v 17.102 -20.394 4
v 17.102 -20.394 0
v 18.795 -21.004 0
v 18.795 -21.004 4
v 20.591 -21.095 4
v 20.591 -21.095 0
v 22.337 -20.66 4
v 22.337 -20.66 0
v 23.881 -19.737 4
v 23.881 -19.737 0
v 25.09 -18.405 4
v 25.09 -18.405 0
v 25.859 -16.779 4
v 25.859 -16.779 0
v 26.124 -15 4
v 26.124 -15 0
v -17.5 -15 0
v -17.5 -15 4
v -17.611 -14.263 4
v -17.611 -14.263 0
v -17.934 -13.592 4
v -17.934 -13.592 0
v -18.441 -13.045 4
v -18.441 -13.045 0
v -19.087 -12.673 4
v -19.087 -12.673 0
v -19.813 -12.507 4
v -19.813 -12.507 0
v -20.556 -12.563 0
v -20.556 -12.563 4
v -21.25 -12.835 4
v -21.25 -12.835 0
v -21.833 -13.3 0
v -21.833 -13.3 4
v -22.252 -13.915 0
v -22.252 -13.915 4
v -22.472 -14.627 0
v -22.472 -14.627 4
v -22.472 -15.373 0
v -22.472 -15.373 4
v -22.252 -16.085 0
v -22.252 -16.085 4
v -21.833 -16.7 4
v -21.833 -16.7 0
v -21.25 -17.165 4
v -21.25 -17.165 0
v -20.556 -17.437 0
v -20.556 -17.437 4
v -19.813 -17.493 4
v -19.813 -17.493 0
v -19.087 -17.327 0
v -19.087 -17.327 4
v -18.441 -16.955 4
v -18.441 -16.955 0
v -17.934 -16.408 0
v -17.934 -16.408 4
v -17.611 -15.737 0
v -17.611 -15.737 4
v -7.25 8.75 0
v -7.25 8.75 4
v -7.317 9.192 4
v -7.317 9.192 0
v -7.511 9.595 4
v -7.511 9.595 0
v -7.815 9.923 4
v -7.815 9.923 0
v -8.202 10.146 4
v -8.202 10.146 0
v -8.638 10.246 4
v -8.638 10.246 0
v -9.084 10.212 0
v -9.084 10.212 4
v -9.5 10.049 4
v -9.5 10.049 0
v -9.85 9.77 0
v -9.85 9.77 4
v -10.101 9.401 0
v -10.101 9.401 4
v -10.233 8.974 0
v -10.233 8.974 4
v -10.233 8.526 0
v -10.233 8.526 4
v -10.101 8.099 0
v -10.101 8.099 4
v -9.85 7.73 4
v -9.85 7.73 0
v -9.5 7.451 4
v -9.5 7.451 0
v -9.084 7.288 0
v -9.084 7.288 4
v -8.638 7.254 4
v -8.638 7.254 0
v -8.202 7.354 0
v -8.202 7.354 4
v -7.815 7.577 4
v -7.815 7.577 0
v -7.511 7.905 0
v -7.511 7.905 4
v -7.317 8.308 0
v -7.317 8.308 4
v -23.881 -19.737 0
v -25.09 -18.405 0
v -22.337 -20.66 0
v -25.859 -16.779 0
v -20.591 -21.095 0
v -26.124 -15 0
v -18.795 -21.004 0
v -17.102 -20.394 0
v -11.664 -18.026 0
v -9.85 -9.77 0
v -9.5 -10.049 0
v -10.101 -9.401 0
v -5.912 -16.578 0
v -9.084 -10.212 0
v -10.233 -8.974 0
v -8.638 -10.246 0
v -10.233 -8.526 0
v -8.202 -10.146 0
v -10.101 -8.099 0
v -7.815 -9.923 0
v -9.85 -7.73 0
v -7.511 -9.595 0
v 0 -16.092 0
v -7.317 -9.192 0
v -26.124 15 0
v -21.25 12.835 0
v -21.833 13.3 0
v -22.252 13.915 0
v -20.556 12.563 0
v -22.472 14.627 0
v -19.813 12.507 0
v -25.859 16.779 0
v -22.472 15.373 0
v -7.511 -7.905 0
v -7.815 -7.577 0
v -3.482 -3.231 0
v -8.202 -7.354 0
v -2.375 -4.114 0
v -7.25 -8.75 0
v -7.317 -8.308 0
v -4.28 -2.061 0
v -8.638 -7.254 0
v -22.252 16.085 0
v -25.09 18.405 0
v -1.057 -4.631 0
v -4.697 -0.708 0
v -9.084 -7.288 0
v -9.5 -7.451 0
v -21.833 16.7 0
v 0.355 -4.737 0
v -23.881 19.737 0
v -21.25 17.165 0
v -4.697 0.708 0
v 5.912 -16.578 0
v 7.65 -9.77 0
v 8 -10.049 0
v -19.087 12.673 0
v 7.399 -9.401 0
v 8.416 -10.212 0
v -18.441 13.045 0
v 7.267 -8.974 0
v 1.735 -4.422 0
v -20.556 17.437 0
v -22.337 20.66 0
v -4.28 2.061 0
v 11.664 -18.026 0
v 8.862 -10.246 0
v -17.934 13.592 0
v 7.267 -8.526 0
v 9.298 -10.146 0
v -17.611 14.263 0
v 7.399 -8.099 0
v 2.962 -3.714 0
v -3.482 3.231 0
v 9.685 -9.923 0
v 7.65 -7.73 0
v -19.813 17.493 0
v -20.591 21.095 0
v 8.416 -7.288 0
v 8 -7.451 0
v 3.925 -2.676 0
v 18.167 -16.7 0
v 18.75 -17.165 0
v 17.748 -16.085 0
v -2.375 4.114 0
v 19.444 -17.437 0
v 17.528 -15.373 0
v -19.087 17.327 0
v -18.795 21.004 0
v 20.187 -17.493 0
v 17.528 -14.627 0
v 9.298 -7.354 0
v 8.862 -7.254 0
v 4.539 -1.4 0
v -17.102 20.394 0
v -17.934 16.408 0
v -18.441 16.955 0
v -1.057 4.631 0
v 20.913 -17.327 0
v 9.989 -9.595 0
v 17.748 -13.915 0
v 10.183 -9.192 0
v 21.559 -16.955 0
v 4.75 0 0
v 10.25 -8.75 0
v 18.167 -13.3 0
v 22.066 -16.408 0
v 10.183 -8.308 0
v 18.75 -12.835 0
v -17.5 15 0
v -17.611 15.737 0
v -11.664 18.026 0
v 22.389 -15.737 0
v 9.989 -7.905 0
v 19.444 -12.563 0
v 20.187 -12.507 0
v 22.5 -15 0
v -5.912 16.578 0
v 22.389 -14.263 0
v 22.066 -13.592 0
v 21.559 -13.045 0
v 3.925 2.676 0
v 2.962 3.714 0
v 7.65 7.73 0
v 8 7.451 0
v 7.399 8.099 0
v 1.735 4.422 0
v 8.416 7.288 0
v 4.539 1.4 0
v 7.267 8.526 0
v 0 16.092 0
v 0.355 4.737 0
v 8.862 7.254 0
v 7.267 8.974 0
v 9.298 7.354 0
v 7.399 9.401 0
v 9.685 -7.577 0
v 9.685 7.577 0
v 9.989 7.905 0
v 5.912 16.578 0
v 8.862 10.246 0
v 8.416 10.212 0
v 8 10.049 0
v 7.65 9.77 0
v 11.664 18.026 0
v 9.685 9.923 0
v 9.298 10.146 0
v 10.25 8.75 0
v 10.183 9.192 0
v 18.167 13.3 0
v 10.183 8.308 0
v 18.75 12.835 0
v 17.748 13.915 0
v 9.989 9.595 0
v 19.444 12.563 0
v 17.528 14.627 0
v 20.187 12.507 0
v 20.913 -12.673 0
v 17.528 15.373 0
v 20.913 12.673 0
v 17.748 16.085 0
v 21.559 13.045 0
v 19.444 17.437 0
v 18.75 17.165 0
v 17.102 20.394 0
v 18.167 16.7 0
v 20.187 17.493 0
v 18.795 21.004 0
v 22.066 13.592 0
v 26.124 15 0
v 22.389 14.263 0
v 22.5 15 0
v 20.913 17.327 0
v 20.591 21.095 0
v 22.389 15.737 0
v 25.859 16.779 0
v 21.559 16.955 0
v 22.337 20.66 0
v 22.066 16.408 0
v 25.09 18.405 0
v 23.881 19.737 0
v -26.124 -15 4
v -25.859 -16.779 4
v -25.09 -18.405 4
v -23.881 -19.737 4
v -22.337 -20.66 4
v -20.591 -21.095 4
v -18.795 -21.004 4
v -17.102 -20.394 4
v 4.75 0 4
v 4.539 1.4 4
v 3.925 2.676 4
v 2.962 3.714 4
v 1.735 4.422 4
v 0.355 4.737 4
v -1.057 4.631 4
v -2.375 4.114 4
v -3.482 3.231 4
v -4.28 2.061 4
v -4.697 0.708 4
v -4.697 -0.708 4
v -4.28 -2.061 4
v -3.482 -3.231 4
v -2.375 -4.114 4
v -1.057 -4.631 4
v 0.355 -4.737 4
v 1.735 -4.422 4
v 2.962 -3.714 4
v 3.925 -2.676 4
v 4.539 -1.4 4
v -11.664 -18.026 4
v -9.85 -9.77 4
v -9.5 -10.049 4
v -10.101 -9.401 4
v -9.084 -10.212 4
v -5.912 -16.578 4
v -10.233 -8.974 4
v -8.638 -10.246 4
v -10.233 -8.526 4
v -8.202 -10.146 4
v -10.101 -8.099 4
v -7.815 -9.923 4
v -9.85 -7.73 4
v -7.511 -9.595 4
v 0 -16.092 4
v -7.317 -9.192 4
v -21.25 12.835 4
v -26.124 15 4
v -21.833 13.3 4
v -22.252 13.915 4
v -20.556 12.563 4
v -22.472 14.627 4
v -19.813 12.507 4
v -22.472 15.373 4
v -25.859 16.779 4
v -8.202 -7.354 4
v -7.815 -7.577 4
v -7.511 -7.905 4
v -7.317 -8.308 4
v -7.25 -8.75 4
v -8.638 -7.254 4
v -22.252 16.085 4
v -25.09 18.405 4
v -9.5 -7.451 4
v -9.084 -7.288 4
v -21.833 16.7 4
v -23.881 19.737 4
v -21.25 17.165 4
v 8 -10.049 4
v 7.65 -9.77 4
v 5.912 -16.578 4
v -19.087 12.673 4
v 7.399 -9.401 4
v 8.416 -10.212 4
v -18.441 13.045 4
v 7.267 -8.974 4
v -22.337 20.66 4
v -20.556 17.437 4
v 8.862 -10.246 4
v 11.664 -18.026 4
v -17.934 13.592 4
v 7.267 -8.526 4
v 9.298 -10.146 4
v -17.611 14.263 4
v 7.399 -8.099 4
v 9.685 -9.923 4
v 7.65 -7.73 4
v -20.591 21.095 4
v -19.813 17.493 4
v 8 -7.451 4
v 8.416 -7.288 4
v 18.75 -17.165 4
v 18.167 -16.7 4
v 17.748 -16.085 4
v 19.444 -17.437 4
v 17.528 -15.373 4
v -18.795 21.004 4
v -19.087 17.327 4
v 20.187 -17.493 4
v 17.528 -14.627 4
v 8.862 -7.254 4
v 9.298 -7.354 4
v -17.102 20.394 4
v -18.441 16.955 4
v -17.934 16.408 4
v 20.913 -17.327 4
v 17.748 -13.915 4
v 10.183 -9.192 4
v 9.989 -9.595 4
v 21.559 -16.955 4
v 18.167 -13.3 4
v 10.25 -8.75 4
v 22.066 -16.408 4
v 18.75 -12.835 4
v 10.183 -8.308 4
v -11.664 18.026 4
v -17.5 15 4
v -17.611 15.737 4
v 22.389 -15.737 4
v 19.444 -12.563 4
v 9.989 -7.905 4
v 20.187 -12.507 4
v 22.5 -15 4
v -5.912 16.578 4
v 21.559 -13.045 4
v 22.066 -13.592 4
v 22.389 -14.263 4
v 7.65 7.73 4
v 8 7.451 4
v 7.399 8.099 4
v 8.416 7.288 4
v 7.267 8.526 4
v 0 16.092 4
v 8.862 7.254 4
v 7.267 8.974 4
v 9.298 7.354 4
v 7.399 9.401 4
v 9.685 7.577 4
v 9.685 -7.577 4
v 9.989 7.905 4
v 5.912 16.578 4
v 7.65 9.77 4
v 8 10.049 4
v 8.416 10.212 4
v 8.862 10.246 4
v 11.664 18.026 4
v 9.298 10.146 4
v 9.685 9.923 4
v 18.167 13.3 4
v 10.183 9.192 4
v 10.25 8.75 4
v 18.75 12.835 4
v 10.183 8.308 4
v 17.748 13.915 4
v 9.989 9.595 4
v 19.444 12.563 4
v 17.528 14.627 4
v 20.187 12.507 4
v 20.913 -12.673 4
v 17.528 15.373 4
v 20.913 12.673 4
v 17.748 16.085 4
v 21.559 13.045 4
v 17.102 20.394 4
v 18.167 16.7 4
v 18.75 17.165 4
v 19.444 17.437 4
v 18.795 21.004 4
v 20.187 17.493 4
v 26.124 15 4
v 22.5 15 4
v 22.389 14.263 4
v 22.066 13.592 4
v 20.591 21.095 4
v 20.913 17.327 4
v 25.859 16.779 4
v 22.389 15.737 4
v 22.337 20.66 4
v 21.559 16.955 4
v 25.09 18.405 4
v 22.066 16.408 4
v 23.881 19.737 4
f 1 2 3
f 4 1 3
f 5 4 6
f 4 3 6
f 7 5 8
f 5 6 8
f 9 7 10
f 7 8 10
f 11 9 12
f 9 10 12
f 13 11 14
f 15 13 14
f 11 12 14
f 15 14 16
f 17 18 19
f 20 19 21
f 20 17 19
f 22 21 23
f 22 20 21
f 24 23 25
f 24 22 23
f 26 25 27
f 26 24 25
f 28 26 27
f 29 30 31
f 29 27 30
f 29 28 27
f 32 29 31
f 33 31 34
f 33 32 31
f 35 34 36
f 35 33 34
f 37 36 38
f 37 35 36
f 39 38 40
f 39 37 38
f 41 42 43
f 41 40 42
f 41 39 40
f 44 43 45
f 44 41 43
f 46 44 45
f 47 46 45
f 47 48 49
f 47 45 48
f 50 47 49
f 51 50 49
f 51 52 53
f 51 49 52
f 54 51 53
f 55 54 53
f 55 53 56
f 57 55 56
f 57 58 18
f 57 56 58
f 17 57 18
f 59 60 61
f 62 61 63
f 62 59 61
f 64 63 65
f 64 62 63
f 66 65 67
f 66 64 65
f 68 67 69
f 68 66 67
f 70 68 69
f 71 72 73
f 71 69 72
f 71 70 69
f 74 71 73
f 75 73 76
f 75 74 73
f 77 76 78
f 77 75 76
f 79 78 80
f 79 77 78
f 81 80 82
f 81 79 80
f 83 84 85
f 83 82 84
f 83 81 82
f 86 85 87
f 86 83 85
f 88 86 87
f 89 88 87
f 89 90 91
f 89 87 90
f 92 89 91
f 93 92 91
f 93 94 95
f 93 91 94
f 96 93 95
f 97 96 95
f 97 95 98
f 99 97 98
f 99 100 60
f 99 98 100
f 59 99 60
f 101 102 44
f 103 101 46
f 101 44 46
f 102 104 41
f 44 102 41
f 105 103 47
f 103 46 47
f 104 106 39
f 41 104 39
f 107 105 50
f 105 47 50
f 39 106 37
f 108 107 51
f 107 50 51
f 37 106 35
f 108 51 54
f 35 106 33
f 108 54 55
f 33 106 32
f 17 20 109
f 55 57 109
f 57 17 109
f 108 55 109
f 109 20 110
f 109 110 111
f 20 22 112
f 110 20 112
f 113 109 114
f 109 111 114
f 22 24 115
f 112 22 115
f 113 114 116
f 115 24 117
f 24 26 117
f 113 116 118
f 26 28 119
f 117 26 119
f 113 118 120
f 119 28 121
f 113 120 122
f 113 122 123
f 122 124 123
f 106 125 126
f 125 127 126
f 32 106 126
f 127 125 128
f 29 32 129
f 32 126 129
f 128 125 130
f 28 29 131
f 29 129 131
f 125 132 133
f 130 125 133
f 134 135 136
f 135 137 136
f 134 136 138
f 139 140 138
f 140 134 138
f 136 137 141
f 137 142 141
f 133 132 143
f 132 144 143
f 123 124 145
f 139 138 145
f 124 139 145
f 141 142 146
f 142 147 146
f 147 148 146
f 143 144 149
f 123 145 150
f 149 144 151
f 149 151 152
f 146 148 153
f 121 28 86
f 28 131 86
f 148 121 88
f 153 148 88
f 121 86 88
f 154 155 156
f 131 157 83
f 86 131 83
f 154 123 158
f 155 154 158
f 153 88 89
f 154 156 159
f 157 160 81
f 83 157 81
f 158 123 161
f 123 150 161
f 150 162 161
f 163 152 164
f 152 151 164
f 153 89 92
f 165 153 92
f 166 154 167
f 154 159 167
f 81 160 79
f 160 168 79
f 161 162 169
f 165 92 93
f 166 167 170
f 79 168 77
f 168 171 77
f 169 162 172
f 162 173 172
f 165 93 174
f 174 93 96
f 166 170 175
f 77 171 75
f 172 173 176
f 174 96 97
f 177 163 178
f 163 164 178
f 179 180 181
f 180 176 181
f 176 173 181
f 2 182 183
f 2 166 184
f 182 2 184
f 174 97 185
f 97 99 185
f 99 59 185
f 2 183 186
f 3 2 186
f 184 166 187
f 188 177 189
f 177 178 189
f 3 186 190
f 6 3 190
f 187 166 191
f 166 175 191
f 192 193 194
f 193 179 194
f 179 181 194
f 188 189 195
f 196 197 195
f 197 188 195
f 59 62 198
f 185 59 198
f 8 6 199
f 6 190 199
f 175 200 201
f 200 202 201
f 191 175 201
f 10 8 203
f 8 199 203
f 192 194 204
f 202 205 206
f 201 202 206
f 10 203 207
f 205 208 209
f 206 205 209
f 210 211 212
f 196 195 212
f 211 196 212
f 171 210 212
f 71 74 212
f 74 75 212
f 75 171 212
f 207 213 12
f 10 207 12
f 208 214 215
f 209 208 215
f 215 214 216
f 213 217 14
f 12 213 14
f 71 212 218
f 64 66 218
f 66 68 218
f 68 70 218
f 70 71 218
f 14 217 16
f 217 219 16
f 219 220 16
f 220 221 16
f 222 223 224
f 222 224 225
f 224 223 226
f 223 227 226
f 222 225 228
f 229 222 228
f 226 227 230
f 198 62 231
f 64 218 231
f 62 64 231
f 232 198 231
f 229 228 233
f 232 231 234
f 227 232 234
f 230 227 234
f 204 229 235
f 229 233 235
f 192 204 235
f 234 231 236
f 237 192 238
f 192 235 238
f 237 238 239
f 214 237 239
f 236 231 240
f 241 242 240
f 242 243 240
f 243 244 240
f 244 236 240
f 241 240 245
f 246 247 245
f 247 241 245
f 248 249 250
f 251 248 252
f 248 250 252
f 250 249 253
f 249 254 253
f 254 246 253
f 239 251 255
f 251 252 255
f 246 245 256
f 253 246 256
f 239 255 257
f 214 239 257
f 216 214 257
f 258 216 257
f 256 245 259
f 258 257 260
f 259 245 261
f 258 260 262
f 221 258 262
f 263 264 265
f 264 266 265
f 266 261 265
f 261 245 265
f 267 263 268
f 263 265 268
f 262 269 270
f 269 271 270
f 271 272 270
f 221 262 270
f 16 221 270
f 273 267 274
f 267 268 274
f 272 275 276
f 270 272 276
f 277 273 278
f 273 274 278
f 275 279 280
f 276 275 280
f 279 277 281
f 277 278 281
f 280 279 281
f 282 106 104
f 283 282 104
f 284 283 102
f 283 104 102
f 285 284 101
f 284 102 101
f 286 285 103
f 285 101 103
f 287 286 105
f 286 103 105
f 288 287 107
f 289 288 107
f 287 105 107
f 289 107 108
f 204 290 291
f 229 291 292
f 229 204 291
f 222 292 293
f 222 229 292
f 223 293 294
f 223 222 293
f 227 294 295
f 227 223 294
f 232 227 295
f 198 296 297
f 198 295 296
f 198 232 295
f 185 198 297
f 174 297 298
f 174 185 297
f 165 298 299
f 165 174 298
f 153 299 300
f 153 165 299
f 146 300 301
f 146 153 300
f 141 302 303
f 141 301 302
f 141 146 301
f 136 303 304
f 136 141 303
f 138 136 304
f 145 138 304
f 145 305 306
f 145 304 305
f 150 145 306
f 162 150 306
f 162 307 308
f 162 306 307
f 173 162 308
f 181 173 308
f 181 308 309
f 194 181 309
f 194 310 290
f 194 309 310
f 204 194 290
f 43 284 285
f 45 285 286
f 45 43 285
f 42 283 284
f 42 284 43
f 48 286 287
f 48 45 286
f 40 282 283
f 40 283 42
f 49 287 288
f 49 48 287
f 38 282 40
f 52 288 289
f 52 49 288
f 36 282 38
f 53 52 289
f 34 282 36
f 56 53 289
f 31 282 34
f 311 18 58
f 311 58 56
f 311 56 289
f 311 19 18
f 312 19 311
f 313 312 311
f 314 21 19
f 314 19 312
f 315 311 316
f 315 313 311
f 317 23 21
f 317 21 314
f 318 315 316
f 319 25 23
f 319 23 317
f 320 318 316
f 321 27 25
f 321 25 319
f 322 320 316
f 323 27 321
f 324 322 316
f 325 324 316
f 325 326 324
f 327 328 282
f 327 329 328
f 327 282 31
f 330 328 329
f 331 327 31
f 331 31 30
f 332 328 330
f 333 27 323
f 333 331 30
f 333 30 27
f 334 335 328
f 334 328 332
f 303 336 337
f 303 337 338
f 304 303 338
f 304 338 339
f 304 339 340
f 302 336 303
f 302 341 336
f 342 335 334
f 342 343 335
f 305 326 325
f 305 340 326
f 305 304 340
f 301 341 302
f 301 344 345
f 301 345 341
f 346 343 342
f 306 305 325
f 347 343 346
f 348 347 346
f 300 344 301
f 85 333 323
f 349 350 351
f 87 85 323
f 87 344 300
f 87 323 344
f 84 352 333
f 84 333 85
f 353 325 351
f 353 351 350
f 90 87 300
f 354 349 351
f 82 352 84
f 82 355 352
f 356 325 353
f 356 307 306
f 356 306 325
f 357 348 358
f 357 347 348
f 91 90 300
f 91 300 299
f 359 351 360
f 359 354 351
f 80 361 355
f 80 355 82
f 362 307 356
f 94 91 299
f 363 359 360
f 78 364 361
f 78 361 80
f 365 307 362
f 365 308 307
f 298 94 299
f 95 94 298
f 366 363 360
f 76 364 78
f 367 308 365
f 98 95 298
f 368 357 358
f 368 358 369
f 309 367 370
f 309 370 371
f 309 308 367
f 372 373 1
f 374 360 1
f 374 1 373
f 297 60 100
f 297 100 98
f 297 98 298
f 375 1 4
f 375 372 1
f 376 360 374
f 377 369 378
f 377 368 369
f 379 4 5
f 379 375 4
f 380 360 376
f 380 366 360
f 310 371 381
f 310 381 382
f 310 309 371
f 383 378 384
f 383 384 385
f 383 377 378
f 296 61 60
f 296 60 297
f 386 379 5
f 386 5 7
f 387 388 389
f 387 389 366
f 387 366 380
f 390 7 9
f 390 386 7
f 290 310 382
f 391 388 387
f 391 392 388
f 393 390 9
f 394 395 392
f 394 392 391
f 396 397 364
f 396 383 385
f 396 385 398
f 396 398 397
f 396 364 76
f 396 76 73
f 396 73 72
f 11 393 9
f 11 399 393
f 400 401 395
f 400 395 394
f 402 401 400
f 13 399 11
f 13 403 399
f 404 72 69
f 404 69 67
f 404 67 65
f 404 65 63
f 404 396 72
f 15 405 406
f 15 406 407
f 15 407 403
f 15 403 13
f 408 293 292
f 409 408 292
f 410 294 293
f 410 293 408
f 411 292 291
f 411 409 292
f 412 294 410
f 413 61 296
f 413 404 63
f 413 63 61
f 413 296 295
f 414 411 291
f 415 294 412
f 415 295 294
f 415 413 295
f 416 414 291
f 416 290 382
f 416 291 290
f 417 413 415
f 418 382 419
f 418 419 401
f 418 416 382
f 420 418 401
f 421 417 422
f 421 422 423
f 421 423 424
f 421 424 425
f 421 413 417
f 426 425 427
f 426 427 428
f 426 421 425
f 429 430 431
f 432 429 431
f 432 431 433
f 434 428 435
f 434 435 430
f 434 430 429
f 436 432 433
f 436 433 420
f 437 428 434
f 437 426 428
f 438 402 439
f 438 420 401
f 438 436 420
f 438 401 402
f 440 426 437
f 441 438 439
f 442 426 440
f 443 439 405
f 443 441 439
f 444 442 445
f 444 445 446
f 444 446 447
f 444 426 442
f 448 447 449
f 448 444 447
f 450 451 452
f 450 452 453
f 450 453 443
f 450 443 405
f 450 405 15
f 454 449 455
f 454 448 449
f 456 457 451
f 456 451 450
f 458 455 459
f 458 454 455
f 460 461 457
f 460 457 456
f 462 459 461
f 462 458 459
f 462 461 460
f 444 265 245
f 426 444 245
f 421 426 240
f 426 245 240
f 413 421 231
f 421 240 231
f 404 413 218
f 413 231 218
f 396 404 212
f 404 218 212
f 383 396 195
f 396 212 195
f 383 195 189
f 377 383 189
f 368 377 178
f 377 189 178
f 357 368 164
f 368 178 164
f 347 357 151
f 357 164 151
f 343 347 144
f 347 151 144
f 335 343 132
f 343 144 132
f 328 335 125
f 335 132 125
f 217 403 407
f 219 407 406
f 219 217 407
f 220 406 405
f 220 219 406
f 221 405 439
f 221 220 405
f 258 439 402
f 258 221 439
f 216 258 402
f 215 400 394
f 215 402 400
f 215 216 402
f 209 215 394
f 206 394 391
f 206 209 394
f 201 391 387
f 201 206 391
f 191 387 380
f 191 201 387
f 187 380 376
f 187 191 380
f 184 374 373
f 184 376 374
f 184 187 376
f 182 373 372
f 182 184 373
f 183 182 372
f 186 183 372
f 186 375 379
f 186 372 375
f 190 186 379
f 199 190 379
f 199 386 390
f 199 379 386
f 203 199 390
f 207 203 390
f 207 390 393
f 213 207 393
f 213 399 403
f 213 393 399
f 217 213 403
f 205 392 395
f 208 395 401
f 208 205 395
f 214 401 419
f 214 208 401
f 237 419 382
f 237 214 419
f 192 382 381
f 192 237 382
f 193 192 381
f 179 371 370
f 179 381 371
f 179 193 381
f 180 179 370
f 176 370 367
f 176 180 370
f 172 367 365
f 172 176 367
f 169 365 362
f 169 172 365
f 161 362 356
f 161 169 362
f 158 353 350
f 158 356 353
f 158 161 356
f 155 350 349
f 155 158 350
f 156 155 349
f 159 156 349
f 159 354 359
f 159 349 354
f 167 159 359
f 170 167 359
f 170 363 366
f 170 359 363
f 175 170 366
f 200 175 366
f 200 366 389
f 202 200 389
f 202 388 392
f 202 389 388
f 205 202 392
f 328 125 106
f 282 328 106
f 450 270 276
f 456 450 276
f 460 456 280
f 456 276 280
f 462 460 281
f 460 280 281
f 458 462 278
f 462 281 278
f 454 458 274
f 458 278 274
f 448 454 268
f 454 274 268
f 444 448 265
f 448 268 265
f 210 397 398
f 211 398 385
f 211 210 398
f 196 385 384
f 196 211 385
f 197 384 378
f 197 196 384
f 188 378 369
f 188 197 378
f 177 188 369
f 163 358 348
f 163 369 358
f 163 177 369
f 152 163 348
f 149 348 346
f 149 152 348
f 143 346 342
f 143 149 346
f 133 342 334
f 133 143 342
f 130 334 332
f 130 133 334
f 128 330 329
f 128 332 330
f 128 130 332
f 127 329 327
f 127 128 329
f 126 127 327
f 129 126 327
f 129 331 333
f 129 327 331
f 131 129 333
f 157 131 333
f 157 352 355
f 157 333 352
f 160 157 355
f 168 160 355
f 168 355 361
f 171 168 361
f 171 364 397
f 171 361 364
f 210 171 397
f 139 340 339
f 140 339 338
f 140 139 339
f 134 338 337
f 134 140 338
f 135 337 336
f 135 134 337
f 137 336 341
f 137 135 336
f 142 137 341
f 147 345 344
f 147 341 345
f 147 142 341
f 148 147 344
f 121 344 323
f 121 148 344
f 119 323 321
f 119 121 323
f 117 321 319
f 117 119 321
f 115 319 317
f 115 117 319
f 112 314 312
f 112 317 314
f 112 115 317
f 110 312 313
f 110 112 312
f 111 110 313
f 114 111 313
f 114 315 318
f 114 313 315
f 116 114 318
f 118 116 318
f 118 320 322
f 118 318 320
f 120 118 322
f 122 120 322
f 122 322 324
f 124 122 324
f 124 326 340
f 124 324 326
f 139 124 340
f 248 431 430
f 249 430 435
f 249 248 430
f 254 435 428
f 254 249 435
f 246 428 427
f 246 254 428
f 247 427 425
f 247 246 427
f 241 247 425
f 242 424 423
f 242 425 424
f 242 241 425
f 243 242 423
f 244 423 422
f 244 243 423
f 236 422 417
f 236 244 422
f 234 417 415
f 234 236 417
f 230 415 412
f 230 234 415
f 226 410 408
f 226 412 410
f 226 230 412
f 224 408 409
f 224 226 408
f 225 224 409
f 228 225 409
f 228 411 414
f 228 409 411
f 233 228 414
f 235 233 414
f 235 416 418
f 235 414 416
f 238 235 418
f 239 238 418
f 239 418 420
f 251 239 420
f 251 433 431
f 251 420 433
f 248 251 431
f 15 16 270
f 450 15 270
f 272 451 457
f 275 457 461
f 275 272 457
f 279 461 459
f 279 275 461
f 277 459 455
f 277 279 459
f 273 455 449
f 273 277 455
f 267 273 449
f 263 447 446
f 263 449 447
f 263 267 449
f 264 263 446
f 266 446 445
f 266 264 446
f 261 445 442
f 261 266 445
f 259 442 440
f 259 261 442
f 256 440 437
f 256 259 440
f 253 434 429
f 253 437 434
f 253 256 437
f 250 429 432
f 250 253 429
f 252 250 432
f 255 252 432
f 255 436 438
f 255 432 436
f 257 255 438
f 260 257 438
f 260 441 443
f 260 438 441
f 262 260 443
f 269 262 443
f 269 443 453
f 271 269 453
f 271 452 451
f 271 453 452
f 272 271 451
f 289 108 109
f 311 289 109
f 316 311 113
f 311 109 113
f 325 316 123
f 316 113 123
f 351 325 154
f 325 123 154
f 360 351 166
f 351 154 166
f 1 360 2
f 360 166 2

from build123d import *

# Parameters (mm, degrees)
SKETCH6_R           = 6.123610741
BOSS_EXTRUDE1_DEPTH = 4
SKETCH1_R           = 1.5
SKETCH1_R_2         = 4.75
CUT_EXTRUDE1_DEPTH  = 34.832676052
SKETCH4_R           = 2.5
CUT_EXTRUDE2_DEPTH  = 34.832676052


with BuildPart() as part:
    # Sketch6 → Boss-Extrude1 (new body)
    with BuildSketch(Plane.XY):
        with BuildLine():
            ThreePointArc((-13.876389259, 15), (-20, 8.876389259), (-26.123610741, 15))
            Line((-26.123610741, 15), (-26.123610741, -15))
            ThreePointArc((-26.123610741, -15), (-20, -8.876389259), (-13.876389259, -15))
            ThreePointArc((-13.876389259, -15), (-14.744302684, -18.142650827), (-17.102020228, -20.394471406))
            ThreePointArc((-17.102020228, -20.394471406), (0, -16.091558121), (17.102020228, -20.394471406))
            ThreePointArc((17.102020228, -20.394471406), (16.857349173, -9.744302684), (26.123610741, -15))
            Line((26.123610741, -15), (26.123610741, 15))
            ThreePointArc((26.123610741, 15), (16.857349173, 9.744302684), (17.102020228, 20.394471406))
            ThreePointArc((17.102020228, 20.394471406), (0, 16.091558121), (-17.102020228, 20.394471406))
            ThreePointArc((-17.102020228, 20.394471406), (-14.744302684, 18.142650827), (-13.876389259, 15))
        make_face()
        with Locations((-20, -15)):
            Circle(SKETCH6_R)
        with Locations((-20, 15)):
            Circle(SKETCH6_R)
        with Locations((20, 15)):
            Circle(SKETCH6_R)
        with Locations((20, -15)):
            Circle(SKETCH6_R)
    extrude(amount=BOSS_EXTRUDE1_DEPTH)

    # Sketch1 → Cut-Extrude1 (cut, through all)
    with BuildSketch(Plane.XY):
        with Locations((-8.75, -8.75)):
            Circle(SKETCH1_R)
        with Locations((-8.75, 8.75)):
            Circle(SKETCH1_R)
        with Locations((8.75, 8.75)):
            Circle(SKETCH1_R)
        with Locations((8.75, -8.75)):
            Circle(SKETCH1_R)
        Circle(SKETCH1_R_2)
    extrude(amount=CUT_EXTRUDE1_DEPTH, mode=Mode.SUBTRACT)

    # Sketch4 → Cut-Extrude2 (cut, through all)
    with BuildSketch(Plane.XY):
        with Locations((-20, 15)):
            Circle(SKETCH4_R)
        with Locations((20, 15)):
            Circle(SKETCH4_R)
        with Locations((20, -15)):
            Circle(SKETCH4_R)
        with Locations((-20, -15)):
            Circle(SKETCH4_R)
    extrude(amount=CUT_EXTRUDE2_DEPTH, mode=Mode.SUBTRACT)


solid = part.part
